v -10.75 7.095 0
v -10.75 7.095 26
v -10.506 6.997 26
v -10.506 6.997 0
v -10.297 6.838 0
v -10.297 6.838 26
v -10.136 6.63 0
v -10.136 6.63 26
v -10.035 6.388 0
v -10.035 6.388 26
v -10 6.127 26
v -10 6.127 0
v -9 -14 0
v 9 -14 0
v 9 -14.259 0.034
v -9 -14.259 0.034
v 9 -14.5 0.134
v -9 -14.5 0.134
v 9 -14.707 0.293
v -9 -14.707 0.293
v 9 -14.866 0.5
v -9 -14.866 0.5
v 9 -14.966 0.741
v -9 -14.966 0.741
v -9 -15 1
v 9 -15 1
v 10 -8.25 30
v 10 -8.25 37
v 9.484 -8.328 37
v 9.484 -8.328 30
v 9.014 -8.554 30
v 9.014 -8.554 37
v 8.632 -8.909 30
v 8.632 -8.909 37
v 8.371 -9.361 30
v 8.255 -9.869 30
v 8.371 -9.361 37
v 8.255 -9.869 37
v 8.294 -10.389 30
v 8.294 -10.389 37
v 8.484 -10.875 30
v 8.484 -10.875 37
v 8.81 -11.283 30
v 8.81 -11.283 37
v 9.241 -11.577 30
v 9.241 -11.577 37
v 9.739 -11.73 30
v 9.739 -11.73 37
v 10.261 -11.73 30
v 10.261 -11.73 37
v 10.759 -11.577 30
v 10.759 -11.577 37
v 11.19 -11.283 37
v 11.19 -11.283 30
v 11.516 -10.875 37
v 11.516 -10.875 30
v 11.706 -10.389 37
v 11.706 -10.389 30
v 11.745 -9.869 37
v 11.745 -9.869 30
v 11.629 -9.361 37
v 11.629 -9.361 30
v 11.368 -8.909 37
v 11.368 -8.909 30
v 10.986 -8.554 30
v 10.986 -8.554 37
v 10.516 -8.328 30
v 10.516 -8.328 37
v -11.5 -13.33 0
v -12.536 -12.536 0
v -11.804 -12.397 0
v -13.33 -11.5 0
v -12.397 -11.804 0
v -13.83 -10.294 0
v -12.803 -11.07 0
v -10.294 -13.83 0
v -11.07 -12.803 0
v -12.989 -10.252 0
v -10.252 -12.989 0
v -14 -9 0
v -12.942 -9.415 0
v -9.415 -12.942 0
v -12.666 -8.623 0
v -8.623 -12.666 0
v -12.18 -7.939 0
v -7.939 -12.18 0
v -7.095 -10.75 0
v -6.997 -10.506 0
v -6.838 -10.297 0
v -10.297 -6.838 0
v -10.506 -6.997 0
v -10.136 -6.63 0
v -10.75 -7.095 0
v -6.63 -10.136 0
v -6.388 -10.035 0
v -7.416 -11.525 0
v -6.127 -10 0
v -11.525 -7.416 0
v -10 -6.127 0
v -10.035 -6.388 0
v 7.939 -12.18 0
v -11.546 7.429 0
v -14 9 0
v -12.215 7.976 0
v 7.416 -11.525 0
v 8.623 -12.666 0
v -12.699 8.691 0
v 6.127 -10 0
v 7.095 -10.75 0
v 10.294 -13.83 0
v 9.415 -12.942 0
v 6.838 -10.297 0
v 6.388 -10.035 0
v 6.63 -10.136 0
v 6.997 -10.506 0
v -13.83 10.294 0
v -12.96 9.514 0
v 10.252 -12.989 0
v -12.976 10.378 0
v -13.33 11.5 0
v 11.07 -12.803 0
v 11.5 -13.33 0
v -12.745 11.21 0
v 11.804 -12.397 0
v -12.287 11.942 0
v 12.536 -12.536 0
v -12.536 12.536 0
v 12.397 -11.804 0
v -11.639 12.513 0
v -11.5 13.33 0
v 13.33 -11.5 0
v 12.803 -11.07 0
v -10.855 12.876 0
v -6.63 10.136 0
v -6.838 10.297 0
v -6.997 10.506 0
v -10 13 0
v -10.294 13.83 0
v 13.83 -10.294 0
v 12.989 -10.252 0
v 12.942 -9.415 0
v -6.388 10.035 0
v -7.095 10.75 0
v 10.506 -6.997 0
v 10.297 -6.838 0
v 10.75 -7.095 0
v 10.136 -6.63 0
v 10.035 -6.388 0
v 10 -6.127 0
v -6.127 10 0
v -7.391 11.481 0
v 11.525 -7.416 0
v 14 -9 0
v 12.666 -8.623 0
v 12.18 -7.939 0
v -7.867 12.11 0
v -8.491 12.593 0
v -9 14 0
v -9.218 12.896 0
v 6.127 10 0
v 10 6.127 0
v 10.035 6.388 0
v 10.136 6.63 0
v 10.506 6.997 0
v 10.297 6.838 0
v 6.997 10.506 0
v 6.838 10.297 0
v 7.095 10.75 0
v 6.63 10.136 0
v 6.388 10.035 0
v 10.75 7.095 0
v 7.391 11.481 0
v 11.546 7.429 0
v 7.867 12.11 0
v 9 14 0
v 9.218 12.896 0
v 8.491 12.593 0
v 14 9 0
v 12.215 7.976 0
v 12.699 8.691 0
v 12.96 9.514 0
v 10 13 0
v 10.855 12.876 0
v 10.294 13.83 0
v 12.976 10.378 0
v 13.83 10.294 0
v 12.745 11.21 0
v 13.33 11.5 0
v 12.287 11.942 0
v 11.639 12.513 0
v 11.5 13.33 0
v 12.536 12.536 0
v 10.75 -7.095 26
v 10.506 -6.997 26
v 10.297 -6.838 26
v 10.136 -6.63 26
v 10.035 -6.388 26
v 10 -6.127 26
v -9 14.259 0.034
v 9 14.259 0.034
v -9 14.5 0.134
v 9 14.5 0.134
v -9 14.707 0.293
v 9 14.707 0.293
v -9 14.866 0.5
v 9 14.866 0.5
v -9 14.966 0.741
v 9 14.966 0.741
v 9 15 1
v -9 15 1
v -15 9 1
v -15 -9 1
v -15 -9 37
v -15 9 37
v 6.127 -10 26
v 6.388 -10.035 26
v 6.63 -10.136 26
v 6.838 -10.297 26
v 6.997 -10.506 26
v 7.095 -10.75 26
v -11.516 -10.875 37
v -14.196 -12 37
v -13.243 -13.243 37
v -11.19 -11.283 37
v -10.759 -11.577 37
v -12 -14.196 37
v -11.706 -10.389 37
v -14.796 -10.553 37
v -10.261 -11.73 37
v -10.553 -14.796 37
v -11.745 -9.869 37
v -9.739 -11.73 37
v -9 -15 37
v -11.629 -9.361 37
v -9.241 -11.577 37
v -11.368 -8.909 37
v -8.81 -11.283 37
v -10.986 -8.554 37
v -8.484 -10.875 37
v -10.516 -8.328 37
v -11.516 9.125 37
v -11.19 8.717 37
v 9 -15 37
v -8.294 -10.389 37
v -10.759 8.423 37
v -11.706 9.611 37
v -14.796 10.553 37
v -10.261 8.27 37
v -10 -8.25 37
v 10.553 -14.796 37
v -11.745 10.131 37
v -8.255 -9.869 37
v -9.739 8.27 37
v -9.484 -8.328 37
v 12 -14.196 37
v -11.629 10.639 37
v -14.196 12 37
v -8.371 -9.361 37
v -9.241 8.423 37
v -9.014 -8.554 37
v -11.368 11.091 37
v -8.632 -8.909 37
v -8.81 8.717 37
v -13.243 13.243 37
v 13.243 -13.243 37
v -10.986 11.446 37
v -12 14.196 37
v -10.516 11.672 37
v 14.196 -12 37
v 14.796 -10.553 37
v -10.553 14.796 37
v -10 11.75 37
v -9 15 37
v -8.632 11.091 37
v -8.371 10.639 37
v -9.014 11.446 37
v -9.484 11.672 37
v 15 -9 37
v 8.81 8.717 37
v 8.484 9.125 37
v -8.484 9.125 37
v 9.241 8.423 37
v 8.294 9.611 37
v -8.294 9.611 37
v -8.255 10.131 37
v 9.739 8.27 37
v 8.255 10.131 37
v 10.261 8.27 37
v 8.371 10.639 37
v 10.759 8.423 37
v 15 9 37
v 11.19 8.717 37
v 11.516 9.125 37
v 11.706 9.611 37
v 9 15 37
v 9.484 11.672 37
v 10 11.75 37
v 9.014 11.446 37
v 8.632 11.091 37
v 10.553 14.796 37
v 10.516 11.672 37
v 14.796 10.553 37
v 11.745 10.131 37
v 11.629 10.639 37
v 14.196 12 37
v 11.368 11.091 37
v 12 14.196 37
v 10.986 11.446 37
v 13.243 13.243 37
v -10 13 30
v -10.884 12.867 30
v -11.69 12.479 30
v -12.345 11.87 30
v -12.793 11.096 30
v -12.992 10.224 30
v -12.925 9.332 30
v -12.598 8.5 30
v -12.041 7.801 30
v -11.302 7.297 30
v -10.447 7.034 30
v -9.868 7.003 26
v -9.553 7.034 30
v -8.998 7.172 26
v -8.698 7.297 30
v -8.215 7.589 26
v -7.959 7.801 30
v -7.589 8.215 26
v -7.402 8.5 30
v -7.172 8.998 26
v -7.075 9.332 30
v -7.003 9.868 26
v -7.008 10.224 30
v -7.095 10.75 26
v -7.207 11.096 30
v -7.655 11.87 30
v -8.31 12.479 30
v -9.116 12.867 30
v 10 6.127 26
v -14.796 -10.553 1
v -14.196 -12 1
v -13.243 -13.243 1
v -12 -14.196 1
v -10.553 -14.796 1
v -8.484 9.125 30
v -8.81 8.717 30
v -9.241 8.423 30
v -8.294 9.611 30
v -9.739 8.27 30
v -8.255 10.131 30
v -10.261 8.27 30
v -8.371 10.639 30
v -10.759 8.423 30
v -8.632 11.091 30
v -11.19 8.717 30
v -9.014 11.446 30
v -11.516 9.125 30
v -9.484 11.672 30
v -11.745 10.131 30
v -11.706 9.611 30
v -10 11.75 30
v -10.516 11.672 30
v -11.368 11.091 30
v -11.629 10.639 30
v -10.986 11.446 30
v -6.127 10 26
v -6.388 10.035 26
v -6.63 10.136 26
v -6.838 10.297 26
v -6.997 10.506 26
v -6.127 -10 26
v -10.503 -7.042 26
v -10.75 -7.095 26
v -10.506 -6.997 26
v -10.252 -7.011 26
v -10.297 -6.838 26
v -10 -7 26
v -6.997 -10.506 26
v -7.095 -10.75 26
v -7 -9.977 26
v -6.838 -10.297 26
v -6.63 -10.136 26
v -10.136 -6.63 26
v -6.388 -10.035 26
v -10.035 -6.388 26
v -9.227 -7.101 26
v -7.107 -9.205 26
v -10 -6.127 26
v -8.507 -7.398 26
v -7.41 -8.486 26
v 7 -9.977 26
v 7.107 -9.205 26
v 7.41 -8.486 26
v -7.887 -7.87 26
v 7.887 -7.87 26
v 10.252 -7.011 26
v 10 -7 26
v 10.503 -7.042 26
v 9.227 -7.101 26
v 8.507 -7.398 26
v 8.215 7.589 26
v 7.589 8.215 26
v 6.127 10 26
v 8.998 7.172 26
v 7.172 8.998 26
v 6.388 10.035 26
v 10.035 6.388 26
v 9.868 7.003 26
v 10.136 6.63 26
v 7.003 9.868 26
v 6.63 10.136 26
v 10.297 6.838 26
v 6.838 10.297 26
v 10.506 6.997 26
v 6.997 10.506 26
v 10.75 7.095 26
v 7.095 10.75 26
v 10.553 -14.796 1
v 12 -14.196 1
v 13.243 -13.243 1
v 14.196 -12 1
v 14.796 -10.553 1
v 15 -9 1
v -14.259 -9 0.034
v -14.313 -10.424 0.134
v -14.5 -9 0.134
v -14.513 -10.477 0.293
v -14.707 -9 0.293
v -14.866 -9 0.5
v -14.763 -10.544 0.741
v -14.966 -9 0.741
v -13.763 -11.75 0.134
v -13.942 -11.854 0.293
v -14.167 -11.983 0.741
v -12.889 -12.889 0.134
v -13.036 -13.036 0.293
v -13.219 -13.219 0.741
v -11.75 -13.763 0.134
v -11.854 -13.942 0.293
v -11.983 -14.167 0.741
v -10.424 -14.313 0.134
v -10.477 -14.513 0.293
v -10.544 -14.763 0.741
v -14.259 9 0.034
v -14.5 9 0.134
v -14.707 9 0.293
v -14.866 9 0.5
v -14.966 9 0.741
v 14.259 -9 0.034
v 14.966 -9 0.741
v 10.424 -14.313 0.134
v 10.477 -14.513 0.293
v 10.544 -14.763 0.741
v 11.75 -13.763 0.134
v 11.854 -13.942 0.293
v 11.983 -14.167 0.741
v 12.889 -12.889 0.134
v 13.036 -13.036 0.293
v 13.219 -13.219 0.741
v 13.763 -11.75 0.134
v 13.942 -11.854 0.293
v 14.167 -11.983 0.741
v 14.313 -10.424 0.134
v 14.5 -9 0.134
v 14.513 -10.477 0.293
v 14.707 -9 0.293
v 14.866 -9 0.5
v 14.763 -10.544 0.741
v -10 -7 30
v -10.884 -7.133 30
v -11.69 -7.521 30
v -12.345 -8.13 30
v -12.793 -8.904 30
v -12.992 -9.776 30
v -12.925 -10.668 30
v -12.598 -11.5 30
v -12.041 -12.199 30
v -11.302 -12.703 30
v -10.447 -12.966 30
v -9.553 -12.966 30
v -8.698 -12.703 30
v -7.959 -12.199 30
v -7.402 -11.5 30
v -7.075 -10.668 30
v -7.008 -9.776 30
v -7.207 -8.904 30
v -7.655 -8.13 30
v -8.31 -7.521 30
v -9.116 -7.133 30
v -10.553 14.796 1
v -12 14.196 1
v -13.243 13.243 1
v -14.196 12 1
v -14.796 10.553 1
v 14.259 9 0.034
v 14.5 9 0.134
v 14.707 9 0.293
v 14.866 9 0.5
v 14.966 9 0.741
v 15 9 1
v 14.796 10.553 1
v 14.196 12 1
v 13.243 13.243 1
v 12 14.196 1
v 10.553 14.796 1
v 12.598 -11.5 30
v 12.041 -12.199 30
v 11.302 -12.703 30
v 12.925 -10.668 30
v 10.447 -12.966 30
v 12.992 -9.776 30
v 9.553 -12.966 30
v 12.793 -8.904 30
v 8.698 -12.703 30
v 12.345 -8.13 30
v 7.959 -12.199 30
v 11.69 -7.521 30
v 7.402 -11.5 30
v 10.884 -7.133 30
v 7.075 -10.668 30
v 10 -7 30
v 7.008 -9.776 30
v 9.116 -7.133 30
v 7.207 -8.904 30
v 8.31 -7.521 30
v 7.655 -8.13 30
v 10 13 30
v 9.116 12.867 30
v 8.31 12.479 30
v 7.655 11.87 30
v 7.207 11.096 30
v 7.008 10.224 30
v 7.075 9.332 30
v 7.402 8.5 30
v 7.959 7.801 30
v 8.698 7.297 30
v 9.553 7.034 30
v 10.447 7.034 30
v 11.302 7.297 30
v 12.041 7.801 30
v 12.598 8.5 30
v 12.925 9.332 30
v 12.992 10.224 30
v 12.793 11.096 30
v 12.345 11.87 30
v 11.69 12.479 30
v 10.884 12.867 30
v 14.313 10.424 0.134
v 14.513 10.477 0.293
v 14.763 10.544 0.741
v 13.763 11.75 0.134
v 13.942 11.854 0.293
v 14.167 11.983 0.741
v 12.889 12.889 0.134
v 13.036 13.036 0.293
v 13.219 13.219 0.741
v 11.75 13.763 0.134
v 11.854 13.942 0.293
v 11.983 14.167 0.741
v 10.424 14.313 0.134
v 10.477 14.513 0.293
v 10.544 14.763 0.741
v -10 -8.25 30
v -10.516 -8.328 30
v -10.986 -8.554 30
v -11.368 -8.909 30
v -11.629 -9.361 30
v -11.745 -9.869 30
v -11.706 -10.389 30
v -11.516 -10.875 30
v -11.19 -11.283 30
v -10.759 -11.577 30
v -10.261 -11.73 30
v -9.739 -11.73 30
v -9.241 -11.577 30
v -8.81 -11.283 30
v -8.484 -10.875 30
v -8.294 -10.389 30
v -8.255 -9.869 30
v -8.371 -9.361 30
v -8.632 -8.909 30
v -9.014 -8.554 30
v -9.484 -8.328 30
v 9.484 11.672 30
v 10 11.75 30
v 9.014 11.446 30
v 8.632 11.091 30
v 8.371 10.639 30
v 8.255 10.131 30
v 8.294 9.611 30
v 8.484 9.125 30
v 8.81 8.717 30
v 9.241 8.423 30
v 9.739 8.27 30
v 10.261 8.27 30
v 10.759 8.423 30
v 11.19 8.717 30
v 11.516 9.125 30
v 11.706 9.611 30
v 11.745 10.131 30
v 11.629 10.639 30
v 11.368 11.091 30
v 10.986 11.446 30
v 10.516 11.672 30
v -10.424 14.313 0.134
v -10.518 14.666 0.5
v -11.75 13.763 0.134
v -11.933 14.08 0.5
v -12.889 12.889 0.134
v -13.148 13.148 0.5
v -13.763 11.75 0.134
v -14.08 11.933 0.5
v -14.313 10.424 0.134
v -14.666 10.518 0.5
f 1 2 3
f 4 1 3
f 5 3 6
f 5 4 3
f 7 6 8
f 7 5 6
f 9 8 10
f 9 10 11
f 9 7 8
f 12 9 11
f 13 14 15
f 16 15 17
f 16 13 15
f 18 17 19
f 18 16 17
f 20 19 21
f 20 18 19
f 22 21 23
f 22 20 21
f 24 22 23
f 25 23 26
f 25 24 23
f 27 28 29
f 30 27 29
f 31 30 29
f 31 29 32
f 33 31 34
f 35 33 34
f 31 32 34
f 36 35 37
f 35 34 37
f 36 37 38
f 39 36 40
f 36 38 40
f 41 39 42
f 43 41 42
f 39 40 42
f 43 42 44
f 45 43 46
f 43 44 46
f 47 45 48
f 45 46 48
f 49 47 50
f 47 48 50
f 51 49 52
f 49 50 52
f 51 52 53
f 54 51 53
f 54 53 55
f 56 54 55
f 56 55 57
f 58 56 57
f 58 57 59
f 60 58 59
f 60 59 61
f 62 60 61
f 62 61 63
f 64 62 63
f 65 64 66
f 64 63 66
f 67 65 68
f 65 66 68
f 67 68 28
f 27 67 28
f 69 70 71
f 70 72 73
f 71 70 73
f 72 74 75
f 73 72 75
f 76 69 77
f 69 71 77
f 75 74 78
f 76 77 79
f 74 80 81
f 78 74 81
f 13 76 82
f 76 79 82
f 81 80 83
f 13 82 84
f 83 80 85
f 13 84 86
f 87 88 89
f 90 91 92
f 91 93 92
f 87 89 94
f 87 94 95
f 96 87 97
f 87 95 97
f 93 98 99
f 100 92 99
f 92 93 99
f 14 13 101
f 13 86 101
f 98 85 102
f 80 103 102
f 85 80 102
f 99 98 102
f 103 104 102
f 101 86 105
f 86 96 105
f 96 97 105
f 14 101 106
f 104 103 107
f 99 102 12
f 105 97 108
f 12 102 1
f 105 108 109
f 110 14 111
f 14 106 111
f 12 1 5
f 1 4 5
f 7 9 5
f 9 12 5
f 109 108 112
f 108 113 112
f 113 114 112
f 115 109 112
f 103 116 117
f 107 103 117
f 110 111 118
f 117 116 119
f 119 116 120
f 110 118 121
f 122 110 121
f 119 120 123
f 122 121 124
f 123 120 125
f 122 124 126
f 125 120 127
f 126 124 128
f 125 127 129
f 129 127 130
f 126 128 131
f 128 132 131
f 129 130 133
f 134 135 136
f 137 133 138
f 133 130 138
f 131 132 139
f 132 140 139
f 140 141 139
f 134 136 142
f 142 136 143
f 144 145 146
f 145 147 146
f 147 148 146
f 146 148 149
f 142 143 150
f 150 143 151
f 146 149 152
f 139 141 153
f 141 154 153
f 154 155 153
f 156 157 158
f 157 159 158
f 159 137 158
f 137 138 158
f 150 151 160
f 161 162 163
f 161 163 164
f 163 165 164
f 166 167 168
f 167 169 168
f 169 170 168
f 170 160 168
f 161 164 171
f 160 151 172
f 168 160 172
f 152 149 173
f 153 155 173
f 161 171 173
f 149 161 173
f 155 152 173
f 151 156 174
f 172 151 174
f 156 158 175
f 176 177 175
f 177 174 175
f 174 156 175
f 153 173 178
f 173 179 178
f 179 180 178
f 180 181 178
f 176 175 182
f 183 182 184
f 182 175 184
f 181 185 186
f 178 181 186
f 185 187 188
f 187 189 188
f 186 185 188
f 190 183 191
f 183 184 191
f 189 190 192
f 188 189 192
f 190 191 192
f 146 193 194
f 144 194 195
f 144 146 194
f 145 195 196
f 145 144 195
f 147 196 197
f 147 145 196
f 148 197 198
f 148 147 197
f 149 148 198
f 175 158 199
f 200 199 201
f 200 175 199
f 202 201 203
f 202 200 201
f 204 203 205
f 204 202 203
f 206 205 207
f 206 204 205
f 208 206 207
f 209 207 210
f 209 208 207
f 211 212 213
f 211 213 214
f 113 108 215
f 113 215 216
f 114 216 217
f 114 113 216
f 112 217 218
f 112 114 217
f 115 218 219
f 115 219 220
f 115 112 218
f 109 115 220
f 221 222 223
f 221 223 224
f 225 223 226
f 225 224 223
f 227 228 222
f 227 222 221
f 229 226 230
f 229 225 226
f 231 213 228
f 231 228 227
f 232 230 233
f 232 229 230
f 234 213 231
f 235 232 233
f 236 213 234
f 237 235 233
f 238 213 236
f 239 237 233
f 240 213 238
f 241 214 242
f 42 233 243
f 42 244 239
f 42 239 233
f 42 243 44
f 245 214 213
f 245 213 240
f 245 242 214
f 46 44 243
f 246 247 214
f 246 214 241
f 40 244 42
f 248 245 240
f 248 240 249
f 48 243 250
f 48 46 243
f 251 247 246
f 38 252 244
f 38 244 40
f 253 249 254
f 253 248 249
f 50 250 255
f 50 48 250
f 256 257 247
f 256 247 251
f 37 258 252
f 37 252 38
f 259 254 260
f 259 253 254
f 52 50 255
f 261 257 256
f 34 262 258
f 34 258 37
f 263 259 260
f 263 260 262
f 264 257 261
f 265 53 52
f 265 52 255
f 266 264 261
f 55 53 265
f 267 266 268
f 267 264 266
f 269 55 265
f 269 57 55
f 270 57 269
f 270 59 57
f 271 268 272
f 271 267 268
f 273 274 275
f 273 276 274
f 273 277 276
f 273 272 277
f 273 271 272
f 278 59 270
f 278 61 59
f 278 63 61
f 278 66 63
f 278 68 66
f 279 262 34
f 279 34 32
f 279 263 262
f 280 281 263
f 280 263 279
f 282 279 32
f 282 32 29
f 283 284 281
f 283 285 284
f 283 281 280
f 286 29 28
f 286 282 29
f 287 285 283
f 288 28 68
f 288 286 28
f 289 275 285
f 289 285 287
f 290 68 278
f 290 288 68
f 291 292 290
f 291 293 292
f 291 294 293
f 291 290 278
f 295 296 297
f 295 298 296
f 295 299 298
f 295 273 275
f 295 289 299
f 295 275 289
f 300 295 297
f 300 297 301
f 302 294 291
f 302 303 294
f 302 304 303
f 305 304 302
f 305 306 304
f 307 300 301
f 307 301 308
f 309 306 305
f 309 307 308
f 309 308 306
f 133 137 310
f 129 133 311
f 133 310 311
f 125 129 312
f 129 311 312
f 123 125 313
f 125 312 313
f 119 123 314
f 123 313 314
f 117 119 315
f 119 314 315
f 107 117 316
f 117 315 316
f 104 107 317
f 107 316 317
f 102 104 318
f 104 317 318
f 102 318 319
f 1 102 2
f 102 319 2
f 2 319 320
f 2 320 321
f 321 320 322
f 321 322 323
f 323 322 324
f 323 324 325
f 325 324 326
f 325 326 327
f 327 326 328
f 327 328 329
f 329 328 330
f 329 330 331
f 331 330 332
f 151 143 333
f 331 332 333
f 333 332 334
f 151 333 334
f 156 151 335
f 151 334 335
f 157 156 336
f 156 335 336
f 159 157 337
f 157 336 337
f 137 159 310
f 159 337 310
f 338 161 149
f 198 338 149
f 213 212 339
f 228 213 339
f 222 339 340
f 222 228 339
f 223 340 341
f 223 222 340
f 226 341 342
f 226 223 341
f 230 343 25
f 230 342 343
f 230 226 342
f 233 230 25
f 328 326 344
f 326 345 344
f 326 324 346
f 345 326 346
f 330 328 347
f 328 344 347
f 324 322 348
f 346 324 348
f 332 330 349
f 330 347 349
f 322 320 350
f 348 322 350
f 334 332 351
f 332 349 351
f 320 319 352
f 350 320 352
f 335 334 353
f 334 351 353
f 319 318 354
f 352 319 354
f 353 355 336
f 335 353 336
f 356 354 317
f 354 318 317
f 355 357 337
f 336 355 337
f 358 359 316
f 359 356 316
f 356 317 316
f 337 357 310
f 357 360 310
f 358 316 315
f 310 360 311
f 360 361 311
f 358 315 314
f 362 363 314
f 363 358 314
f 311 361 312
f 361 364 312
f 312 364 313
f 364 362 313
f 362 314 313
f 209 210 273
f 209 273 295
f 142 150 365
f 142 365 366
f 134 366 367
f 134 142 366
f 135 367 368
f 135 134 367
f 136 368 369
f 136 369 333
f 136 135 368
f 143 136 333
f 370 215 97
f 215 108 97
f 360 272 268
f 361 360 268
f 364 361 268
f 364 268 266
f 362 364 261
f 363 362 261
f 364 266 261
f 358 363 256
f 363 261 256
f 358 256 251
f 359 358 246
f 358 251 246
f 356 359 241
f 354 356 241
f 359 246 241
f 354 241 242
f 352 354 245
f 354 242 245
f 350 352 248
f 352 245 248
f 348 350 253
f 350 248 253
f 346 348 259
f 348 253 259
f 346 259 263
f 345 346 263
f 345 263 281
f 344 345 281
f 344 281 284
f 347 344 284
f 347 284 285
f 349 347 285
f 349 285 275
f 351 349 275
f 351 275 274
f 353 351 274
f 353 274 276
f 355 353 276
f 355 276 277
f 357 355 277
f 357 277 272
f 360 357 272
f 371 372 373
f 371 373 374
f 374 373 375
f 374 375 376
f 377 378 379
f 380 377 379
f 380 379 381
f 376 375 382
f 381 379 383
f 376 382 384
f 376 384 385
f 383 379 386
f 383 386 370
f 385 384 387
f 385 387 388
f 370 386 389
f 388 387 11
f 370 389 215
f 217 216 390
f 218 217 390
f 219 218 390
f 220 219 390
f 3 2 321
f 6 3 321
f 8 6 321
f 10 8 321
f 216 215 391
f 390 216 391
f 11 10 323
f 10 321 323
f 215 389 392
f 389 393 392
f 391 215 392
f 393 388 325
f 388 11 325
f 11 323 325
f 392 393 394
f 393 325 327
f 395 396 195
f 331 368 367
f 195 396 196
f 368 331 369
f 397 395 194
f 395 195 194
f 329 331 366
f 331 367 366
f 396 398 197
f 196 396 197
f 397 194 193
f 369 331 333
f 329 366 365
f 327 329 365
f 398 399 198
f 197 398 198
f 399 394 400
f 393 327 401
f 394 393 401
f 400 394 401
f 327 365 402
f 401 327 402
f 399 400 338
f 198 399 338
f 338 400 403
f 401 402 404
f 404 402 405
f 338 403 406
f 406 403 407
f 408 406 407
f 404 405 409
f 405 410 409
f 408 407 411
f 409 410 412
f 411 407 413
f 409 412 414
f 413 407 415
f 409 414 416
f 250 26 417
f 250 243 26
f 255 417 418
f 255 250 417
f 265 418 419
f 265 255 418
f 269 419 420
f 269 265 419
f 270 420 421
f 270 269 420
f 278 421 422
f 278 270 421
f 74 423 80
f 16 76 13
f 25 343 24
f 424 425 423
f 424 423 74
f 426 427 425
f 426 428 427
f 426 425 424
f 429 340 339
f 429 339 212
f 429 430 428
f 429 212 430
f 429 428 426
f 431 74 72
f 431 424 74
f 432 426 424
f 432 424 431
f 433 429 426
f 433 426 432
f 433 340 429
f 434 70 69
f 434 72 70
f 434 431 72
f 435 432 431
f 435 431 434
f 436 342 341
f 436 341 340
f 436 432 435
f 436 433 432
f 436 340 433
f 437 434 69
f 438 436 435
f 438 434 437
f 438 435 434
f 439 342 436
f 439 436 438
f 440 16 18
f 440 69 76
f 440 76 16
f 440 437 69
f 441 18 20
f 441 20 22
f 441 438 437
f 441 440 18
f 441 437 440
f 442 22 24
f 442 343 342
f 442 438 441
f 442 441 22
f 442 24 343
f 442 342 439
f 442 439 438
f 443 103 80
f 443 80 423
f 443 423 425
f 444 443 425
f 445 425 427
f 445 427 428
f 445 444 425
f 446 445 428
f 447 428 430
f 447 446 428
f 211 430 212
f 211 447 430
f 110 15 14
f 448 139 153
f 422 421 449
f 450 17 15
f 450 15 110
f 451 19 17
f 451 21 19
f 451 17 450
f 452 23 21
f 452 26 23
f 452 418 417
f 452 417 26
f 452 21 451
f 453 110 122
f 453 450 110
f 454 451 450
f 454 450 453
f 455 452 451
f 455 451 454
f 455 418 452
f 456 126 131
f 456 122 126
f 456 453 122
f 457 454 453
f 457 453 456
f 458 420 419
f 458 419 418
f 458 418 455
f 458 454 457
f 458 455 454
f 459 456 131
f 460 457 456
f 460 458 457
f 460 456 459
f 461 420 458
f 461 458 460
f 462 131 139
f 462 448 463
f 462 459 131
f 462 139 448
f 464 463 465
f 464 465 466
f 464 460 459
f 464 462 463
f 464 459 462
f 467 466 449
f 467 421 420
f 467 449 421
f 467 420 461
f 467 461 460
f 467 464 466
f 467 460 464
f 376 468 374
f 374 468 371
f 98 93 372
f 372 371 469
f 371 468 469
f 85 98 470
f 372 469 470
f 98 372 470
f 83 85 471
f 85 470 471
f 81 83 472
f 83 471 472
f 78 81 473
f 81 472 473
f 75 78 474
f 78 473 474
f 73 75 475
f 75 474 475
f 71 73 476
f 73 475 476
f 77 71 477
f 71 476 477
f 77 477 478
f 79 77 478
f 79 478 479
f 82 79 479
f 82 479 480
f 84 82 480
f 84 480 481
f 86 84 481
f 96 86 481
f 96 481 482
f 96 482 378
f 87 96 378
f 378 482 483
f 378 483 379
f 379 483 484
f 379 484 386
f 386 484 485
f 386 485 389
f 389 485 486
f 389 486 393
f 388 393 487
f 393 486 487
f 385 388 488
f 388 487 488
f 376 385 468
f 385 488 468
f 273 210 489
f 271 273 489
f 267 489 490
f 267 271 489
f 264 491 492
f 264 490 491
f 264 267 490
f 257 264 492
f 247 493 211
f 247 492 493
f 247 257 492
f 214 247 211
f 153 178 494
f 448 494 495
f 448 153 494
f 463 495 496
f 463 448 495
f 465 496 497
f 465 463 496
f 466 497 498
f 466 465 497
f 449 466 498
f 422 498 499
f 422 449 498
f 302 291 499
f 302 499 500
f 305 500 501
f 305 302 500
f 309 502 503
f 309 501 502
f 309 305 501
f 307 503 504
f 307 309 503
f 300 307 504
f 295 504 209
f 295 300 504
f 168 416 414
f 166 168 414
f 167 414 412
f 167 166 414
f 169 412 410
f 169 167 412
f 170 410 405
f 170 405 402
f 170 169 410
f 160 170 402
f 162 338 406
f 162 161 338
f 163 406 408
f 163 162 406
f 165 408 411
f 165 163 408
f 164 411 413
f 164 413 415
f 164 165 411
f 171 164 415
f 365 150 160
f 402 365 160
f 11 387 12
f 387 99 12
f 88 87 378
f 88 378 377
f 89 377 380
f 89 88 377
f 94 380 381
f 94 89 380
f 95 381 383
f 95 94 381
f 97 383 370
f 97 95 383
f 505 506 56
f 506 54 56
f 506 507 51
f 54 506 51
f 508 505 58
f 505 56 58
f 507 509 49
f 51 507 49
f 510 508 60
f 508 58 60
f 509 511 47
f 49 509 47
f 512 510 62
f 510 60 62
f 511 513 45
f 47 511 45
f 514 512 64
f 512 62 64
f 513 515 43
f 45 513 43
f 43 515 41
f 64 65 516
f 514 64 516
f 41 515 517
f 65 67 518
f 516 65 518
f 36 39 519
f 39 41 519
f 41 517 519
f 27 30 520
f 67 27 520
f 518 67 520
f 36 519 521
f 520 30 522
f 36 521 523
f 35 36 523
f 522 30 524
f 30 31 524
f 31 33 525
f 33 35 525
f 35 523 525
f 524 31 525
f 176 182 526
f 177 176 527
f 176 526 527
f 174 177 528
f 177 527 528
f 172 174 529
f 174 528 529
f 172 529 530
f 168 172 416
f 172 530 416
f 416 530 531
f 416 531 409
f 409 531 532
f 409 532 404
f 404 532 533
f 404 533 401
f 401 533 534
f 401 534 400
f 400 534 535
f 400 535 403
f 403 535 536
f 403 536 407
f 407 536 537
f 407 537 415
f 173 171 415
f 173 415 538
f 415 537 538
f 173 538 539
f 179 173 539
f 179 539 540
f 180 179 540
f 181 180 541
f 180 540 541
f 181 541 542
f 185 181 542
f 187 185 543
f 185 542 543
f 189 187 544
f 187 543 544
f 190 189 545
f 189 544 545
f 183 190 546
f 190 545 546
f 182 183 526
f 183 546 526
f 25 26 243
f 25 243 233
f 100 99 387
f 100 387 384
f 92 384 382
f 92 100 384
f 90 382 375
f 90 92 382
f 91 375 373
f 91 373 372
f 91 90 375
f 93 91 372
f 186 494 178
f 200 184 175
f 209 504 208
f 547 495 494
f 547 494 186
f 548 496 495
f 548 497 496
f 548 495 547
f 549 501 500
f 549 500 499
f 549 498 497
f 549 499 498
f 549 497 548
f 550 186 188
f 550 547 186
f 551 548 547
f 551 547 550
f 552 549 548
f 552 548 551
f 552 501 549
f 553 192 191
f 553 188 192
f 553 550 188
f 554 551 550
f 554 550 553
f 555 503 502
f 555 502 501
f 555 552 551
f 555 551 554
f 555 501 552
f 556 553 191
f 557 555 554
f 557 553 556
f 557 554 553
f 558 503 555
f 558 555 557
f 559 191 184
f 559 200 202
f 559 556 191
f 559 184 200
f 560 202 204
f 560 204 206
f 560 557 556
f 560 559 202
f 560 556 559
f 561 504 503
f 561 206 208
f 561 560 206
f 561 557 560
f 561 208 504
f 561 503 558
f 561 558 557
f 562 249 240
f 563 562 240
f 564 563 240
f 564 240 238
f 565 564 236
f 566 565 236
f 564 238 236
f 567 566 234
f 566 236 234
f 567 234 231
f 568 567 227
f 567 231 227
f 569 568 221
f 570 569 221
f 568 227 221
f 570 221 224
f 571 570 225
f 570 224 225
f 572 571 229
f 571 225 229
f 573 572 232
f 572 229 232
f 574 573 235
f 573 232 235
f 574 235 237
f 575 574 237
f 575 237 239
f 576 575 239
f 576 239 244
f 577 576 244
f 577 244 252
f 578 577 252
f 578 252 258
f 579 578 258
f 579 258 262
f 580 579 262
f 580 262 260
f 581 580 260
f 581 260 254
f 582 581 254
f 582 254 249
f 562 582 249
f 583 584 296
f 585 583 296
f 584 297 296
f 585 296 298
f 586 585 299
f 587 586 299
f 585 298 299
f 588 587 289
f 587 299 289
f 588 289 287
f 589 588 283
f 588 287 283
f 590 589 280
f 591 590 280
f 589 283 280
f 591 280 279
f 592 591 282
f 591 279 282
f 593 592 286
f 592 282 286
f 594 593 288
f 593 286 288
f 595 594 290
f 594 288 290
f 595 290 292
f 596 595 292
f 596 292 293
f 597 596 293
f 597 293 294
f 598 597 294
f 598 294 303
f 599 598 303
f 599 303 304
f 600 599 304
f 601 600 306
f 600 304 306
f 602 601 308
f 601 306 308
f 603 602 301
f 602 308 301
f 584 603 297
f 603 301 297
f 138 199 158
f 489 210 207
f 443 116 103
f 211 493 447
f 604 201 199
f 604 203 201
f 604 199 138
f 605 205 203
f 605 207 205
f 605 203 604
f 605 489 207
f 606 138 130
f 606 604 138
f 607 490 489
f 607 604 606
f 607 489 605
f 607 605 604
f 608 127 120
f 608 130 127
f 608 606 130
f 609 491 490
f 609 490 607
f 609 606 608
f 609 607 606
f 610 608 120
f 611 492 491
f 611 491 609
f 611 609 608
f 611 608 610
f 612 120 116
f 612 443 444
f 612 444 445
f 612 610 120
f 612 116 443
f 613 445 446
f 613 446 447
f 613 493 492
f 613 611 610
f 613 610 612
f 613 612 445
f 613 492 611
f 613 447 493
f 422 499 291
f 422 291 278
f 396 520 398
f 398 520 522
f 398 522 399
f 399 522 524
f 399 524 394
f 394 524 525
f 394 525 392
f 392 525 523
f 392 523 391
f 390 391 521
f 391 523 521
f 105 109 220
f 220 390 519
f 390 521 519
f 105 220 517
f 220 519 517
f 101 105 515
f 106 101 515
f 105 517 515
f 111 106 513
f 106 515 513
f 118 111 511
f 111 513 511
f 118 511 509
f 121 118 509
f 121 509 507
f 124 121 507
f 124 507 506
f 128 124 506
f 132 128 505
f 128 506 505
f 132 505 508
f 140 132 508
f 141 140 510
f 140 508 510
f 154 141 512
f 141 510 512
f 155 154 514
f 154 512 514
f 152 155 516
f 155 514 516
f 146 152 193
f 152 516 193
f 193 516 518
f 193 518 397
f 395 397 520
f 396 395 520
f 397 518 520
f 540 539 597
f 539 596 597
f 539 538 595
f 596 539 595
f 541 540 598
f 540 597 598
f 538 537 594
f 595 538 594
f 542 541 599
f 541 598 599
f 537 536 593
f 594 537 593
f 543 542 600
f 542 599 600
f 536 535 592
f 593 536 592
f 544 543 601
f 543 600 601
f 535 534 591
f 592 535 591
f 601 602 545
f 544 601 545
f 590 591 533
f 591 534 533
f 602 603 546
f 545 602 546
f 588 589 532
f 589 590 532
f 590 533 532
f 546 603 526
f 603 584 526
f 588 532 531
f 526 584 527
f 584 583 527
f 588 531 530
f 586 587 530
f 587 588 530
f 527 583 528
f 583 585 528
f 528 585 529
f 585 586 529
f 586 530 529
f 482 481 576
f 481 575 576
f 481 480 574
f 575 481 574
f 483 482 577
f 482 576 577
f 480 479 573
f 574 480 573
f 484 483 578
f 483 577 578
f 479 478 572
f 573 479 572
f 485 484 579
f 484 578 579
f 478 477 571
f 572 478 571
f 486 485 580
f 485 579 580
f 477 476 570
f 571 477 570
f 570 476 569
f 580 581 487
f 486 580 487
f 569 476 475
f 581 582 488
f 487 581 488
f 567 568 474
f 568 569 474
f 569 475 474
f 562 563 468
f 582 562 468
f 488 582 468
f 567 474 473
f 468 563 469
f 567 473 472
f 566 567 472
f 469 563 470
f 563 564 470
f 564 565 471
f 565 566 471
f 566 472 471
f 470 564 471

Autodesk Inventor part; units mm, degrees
ref_plane "YZ Plane" through (0, 0, 0) normal (1, 0, 0) x (0, 1, 0)
ref_plane "XZ Plane" through (0, 0, 0) normal (0, 1, 0) x (-1, 0, 0)
ref_plane "XY Plane" through (0, 0, 0) normal (0, 0, 1) x (1, 0, 0)
sketch "Sketch1" plane through (0, 0, 0) normal (0, 0, 1) x (1, 0, 0)
  line L0 (-10, -10) -> (10, -10) construction
  line L1 (10, -10) -> (10, 10) construction
  line L2 (10, 10) -> (-10, 10) construction
  line L3 (-10, 10) -> (-10, -10) construction
  line L4 (-10, -10) -> (10, 10) construction
  line L5 (10, -10) -> (-10, 10) construction
  line L6 (15, -15) -> (-15, -15)
  line L7 (-15, -15) -> (-15, 15)
  line L8 (-15, 15) -> (15, 15)
  line L9 (15, 15) -> (15, -15)
  line L10 (15, -15) -> (-15, 15) construction
  line L11 (-15, -15) -> (15, 15) construction
  line L12 (10, -10) -> (-10, -10)
  line L13 (-10, -10) -> (-10, 10)
  line L14 (-10, 10) -> (10, 10)
  line L15 (10, 10) -> (10, -10)
  line L16 (10, -10) -> (-10, 10) construction
  line L17 (-10, -10) -> (10, 10) construction
  point P0 (0, 0)
  dimension "d0" = 20
  dimension "d1" = 20
  dimension "d2" = 30
  dimension "d3" = 30
extrude "Extrusion1" add sketch "Sketch1" along normal blind 37 contours L6 L7 L8 L9 | L12 L13 L14 L15
extrude "Extrusion2" cut sketch "Sketch1" along normal blind 26 contours L12 L13 L14 L15
hole "Hole1" at (-10, 10, 0) at (10, 10, 0) at (10, -10, 0) at (-10, -10, 0) direction (0, 0, 1) diameter 3.5 end through all counterbore diameter 6 counterbore depth 30
fillet "Fillet1" radius 6 4 edges at (15, -15, 18.5) (15, 15, 18.5) (-15, 15, 18.5) (-15, -15, 18.5)
fillet "Fillet2" radius 1 8 edges at (7, 10, 13) (-7, 10, 13) (10, -7, 13) (-10, -7, 13) (10, 7, 13) (-10, 7, 13) (7, -10, 13) (-7, -10, 13)
fillet "Fillet3" radius 1 8 edges at (-13.2426, 13.2426, 0) (0, 15, 0) (13.2426, 13.2426, 0) (15, 0, 0) (13.2426, -13.2426, 0) (0, -15, 0) (-13.2426, -13.2426, 0) (-15, 0, 0)
equation "\"d3\" = d2"
properties part number "2point_linear_connector"
